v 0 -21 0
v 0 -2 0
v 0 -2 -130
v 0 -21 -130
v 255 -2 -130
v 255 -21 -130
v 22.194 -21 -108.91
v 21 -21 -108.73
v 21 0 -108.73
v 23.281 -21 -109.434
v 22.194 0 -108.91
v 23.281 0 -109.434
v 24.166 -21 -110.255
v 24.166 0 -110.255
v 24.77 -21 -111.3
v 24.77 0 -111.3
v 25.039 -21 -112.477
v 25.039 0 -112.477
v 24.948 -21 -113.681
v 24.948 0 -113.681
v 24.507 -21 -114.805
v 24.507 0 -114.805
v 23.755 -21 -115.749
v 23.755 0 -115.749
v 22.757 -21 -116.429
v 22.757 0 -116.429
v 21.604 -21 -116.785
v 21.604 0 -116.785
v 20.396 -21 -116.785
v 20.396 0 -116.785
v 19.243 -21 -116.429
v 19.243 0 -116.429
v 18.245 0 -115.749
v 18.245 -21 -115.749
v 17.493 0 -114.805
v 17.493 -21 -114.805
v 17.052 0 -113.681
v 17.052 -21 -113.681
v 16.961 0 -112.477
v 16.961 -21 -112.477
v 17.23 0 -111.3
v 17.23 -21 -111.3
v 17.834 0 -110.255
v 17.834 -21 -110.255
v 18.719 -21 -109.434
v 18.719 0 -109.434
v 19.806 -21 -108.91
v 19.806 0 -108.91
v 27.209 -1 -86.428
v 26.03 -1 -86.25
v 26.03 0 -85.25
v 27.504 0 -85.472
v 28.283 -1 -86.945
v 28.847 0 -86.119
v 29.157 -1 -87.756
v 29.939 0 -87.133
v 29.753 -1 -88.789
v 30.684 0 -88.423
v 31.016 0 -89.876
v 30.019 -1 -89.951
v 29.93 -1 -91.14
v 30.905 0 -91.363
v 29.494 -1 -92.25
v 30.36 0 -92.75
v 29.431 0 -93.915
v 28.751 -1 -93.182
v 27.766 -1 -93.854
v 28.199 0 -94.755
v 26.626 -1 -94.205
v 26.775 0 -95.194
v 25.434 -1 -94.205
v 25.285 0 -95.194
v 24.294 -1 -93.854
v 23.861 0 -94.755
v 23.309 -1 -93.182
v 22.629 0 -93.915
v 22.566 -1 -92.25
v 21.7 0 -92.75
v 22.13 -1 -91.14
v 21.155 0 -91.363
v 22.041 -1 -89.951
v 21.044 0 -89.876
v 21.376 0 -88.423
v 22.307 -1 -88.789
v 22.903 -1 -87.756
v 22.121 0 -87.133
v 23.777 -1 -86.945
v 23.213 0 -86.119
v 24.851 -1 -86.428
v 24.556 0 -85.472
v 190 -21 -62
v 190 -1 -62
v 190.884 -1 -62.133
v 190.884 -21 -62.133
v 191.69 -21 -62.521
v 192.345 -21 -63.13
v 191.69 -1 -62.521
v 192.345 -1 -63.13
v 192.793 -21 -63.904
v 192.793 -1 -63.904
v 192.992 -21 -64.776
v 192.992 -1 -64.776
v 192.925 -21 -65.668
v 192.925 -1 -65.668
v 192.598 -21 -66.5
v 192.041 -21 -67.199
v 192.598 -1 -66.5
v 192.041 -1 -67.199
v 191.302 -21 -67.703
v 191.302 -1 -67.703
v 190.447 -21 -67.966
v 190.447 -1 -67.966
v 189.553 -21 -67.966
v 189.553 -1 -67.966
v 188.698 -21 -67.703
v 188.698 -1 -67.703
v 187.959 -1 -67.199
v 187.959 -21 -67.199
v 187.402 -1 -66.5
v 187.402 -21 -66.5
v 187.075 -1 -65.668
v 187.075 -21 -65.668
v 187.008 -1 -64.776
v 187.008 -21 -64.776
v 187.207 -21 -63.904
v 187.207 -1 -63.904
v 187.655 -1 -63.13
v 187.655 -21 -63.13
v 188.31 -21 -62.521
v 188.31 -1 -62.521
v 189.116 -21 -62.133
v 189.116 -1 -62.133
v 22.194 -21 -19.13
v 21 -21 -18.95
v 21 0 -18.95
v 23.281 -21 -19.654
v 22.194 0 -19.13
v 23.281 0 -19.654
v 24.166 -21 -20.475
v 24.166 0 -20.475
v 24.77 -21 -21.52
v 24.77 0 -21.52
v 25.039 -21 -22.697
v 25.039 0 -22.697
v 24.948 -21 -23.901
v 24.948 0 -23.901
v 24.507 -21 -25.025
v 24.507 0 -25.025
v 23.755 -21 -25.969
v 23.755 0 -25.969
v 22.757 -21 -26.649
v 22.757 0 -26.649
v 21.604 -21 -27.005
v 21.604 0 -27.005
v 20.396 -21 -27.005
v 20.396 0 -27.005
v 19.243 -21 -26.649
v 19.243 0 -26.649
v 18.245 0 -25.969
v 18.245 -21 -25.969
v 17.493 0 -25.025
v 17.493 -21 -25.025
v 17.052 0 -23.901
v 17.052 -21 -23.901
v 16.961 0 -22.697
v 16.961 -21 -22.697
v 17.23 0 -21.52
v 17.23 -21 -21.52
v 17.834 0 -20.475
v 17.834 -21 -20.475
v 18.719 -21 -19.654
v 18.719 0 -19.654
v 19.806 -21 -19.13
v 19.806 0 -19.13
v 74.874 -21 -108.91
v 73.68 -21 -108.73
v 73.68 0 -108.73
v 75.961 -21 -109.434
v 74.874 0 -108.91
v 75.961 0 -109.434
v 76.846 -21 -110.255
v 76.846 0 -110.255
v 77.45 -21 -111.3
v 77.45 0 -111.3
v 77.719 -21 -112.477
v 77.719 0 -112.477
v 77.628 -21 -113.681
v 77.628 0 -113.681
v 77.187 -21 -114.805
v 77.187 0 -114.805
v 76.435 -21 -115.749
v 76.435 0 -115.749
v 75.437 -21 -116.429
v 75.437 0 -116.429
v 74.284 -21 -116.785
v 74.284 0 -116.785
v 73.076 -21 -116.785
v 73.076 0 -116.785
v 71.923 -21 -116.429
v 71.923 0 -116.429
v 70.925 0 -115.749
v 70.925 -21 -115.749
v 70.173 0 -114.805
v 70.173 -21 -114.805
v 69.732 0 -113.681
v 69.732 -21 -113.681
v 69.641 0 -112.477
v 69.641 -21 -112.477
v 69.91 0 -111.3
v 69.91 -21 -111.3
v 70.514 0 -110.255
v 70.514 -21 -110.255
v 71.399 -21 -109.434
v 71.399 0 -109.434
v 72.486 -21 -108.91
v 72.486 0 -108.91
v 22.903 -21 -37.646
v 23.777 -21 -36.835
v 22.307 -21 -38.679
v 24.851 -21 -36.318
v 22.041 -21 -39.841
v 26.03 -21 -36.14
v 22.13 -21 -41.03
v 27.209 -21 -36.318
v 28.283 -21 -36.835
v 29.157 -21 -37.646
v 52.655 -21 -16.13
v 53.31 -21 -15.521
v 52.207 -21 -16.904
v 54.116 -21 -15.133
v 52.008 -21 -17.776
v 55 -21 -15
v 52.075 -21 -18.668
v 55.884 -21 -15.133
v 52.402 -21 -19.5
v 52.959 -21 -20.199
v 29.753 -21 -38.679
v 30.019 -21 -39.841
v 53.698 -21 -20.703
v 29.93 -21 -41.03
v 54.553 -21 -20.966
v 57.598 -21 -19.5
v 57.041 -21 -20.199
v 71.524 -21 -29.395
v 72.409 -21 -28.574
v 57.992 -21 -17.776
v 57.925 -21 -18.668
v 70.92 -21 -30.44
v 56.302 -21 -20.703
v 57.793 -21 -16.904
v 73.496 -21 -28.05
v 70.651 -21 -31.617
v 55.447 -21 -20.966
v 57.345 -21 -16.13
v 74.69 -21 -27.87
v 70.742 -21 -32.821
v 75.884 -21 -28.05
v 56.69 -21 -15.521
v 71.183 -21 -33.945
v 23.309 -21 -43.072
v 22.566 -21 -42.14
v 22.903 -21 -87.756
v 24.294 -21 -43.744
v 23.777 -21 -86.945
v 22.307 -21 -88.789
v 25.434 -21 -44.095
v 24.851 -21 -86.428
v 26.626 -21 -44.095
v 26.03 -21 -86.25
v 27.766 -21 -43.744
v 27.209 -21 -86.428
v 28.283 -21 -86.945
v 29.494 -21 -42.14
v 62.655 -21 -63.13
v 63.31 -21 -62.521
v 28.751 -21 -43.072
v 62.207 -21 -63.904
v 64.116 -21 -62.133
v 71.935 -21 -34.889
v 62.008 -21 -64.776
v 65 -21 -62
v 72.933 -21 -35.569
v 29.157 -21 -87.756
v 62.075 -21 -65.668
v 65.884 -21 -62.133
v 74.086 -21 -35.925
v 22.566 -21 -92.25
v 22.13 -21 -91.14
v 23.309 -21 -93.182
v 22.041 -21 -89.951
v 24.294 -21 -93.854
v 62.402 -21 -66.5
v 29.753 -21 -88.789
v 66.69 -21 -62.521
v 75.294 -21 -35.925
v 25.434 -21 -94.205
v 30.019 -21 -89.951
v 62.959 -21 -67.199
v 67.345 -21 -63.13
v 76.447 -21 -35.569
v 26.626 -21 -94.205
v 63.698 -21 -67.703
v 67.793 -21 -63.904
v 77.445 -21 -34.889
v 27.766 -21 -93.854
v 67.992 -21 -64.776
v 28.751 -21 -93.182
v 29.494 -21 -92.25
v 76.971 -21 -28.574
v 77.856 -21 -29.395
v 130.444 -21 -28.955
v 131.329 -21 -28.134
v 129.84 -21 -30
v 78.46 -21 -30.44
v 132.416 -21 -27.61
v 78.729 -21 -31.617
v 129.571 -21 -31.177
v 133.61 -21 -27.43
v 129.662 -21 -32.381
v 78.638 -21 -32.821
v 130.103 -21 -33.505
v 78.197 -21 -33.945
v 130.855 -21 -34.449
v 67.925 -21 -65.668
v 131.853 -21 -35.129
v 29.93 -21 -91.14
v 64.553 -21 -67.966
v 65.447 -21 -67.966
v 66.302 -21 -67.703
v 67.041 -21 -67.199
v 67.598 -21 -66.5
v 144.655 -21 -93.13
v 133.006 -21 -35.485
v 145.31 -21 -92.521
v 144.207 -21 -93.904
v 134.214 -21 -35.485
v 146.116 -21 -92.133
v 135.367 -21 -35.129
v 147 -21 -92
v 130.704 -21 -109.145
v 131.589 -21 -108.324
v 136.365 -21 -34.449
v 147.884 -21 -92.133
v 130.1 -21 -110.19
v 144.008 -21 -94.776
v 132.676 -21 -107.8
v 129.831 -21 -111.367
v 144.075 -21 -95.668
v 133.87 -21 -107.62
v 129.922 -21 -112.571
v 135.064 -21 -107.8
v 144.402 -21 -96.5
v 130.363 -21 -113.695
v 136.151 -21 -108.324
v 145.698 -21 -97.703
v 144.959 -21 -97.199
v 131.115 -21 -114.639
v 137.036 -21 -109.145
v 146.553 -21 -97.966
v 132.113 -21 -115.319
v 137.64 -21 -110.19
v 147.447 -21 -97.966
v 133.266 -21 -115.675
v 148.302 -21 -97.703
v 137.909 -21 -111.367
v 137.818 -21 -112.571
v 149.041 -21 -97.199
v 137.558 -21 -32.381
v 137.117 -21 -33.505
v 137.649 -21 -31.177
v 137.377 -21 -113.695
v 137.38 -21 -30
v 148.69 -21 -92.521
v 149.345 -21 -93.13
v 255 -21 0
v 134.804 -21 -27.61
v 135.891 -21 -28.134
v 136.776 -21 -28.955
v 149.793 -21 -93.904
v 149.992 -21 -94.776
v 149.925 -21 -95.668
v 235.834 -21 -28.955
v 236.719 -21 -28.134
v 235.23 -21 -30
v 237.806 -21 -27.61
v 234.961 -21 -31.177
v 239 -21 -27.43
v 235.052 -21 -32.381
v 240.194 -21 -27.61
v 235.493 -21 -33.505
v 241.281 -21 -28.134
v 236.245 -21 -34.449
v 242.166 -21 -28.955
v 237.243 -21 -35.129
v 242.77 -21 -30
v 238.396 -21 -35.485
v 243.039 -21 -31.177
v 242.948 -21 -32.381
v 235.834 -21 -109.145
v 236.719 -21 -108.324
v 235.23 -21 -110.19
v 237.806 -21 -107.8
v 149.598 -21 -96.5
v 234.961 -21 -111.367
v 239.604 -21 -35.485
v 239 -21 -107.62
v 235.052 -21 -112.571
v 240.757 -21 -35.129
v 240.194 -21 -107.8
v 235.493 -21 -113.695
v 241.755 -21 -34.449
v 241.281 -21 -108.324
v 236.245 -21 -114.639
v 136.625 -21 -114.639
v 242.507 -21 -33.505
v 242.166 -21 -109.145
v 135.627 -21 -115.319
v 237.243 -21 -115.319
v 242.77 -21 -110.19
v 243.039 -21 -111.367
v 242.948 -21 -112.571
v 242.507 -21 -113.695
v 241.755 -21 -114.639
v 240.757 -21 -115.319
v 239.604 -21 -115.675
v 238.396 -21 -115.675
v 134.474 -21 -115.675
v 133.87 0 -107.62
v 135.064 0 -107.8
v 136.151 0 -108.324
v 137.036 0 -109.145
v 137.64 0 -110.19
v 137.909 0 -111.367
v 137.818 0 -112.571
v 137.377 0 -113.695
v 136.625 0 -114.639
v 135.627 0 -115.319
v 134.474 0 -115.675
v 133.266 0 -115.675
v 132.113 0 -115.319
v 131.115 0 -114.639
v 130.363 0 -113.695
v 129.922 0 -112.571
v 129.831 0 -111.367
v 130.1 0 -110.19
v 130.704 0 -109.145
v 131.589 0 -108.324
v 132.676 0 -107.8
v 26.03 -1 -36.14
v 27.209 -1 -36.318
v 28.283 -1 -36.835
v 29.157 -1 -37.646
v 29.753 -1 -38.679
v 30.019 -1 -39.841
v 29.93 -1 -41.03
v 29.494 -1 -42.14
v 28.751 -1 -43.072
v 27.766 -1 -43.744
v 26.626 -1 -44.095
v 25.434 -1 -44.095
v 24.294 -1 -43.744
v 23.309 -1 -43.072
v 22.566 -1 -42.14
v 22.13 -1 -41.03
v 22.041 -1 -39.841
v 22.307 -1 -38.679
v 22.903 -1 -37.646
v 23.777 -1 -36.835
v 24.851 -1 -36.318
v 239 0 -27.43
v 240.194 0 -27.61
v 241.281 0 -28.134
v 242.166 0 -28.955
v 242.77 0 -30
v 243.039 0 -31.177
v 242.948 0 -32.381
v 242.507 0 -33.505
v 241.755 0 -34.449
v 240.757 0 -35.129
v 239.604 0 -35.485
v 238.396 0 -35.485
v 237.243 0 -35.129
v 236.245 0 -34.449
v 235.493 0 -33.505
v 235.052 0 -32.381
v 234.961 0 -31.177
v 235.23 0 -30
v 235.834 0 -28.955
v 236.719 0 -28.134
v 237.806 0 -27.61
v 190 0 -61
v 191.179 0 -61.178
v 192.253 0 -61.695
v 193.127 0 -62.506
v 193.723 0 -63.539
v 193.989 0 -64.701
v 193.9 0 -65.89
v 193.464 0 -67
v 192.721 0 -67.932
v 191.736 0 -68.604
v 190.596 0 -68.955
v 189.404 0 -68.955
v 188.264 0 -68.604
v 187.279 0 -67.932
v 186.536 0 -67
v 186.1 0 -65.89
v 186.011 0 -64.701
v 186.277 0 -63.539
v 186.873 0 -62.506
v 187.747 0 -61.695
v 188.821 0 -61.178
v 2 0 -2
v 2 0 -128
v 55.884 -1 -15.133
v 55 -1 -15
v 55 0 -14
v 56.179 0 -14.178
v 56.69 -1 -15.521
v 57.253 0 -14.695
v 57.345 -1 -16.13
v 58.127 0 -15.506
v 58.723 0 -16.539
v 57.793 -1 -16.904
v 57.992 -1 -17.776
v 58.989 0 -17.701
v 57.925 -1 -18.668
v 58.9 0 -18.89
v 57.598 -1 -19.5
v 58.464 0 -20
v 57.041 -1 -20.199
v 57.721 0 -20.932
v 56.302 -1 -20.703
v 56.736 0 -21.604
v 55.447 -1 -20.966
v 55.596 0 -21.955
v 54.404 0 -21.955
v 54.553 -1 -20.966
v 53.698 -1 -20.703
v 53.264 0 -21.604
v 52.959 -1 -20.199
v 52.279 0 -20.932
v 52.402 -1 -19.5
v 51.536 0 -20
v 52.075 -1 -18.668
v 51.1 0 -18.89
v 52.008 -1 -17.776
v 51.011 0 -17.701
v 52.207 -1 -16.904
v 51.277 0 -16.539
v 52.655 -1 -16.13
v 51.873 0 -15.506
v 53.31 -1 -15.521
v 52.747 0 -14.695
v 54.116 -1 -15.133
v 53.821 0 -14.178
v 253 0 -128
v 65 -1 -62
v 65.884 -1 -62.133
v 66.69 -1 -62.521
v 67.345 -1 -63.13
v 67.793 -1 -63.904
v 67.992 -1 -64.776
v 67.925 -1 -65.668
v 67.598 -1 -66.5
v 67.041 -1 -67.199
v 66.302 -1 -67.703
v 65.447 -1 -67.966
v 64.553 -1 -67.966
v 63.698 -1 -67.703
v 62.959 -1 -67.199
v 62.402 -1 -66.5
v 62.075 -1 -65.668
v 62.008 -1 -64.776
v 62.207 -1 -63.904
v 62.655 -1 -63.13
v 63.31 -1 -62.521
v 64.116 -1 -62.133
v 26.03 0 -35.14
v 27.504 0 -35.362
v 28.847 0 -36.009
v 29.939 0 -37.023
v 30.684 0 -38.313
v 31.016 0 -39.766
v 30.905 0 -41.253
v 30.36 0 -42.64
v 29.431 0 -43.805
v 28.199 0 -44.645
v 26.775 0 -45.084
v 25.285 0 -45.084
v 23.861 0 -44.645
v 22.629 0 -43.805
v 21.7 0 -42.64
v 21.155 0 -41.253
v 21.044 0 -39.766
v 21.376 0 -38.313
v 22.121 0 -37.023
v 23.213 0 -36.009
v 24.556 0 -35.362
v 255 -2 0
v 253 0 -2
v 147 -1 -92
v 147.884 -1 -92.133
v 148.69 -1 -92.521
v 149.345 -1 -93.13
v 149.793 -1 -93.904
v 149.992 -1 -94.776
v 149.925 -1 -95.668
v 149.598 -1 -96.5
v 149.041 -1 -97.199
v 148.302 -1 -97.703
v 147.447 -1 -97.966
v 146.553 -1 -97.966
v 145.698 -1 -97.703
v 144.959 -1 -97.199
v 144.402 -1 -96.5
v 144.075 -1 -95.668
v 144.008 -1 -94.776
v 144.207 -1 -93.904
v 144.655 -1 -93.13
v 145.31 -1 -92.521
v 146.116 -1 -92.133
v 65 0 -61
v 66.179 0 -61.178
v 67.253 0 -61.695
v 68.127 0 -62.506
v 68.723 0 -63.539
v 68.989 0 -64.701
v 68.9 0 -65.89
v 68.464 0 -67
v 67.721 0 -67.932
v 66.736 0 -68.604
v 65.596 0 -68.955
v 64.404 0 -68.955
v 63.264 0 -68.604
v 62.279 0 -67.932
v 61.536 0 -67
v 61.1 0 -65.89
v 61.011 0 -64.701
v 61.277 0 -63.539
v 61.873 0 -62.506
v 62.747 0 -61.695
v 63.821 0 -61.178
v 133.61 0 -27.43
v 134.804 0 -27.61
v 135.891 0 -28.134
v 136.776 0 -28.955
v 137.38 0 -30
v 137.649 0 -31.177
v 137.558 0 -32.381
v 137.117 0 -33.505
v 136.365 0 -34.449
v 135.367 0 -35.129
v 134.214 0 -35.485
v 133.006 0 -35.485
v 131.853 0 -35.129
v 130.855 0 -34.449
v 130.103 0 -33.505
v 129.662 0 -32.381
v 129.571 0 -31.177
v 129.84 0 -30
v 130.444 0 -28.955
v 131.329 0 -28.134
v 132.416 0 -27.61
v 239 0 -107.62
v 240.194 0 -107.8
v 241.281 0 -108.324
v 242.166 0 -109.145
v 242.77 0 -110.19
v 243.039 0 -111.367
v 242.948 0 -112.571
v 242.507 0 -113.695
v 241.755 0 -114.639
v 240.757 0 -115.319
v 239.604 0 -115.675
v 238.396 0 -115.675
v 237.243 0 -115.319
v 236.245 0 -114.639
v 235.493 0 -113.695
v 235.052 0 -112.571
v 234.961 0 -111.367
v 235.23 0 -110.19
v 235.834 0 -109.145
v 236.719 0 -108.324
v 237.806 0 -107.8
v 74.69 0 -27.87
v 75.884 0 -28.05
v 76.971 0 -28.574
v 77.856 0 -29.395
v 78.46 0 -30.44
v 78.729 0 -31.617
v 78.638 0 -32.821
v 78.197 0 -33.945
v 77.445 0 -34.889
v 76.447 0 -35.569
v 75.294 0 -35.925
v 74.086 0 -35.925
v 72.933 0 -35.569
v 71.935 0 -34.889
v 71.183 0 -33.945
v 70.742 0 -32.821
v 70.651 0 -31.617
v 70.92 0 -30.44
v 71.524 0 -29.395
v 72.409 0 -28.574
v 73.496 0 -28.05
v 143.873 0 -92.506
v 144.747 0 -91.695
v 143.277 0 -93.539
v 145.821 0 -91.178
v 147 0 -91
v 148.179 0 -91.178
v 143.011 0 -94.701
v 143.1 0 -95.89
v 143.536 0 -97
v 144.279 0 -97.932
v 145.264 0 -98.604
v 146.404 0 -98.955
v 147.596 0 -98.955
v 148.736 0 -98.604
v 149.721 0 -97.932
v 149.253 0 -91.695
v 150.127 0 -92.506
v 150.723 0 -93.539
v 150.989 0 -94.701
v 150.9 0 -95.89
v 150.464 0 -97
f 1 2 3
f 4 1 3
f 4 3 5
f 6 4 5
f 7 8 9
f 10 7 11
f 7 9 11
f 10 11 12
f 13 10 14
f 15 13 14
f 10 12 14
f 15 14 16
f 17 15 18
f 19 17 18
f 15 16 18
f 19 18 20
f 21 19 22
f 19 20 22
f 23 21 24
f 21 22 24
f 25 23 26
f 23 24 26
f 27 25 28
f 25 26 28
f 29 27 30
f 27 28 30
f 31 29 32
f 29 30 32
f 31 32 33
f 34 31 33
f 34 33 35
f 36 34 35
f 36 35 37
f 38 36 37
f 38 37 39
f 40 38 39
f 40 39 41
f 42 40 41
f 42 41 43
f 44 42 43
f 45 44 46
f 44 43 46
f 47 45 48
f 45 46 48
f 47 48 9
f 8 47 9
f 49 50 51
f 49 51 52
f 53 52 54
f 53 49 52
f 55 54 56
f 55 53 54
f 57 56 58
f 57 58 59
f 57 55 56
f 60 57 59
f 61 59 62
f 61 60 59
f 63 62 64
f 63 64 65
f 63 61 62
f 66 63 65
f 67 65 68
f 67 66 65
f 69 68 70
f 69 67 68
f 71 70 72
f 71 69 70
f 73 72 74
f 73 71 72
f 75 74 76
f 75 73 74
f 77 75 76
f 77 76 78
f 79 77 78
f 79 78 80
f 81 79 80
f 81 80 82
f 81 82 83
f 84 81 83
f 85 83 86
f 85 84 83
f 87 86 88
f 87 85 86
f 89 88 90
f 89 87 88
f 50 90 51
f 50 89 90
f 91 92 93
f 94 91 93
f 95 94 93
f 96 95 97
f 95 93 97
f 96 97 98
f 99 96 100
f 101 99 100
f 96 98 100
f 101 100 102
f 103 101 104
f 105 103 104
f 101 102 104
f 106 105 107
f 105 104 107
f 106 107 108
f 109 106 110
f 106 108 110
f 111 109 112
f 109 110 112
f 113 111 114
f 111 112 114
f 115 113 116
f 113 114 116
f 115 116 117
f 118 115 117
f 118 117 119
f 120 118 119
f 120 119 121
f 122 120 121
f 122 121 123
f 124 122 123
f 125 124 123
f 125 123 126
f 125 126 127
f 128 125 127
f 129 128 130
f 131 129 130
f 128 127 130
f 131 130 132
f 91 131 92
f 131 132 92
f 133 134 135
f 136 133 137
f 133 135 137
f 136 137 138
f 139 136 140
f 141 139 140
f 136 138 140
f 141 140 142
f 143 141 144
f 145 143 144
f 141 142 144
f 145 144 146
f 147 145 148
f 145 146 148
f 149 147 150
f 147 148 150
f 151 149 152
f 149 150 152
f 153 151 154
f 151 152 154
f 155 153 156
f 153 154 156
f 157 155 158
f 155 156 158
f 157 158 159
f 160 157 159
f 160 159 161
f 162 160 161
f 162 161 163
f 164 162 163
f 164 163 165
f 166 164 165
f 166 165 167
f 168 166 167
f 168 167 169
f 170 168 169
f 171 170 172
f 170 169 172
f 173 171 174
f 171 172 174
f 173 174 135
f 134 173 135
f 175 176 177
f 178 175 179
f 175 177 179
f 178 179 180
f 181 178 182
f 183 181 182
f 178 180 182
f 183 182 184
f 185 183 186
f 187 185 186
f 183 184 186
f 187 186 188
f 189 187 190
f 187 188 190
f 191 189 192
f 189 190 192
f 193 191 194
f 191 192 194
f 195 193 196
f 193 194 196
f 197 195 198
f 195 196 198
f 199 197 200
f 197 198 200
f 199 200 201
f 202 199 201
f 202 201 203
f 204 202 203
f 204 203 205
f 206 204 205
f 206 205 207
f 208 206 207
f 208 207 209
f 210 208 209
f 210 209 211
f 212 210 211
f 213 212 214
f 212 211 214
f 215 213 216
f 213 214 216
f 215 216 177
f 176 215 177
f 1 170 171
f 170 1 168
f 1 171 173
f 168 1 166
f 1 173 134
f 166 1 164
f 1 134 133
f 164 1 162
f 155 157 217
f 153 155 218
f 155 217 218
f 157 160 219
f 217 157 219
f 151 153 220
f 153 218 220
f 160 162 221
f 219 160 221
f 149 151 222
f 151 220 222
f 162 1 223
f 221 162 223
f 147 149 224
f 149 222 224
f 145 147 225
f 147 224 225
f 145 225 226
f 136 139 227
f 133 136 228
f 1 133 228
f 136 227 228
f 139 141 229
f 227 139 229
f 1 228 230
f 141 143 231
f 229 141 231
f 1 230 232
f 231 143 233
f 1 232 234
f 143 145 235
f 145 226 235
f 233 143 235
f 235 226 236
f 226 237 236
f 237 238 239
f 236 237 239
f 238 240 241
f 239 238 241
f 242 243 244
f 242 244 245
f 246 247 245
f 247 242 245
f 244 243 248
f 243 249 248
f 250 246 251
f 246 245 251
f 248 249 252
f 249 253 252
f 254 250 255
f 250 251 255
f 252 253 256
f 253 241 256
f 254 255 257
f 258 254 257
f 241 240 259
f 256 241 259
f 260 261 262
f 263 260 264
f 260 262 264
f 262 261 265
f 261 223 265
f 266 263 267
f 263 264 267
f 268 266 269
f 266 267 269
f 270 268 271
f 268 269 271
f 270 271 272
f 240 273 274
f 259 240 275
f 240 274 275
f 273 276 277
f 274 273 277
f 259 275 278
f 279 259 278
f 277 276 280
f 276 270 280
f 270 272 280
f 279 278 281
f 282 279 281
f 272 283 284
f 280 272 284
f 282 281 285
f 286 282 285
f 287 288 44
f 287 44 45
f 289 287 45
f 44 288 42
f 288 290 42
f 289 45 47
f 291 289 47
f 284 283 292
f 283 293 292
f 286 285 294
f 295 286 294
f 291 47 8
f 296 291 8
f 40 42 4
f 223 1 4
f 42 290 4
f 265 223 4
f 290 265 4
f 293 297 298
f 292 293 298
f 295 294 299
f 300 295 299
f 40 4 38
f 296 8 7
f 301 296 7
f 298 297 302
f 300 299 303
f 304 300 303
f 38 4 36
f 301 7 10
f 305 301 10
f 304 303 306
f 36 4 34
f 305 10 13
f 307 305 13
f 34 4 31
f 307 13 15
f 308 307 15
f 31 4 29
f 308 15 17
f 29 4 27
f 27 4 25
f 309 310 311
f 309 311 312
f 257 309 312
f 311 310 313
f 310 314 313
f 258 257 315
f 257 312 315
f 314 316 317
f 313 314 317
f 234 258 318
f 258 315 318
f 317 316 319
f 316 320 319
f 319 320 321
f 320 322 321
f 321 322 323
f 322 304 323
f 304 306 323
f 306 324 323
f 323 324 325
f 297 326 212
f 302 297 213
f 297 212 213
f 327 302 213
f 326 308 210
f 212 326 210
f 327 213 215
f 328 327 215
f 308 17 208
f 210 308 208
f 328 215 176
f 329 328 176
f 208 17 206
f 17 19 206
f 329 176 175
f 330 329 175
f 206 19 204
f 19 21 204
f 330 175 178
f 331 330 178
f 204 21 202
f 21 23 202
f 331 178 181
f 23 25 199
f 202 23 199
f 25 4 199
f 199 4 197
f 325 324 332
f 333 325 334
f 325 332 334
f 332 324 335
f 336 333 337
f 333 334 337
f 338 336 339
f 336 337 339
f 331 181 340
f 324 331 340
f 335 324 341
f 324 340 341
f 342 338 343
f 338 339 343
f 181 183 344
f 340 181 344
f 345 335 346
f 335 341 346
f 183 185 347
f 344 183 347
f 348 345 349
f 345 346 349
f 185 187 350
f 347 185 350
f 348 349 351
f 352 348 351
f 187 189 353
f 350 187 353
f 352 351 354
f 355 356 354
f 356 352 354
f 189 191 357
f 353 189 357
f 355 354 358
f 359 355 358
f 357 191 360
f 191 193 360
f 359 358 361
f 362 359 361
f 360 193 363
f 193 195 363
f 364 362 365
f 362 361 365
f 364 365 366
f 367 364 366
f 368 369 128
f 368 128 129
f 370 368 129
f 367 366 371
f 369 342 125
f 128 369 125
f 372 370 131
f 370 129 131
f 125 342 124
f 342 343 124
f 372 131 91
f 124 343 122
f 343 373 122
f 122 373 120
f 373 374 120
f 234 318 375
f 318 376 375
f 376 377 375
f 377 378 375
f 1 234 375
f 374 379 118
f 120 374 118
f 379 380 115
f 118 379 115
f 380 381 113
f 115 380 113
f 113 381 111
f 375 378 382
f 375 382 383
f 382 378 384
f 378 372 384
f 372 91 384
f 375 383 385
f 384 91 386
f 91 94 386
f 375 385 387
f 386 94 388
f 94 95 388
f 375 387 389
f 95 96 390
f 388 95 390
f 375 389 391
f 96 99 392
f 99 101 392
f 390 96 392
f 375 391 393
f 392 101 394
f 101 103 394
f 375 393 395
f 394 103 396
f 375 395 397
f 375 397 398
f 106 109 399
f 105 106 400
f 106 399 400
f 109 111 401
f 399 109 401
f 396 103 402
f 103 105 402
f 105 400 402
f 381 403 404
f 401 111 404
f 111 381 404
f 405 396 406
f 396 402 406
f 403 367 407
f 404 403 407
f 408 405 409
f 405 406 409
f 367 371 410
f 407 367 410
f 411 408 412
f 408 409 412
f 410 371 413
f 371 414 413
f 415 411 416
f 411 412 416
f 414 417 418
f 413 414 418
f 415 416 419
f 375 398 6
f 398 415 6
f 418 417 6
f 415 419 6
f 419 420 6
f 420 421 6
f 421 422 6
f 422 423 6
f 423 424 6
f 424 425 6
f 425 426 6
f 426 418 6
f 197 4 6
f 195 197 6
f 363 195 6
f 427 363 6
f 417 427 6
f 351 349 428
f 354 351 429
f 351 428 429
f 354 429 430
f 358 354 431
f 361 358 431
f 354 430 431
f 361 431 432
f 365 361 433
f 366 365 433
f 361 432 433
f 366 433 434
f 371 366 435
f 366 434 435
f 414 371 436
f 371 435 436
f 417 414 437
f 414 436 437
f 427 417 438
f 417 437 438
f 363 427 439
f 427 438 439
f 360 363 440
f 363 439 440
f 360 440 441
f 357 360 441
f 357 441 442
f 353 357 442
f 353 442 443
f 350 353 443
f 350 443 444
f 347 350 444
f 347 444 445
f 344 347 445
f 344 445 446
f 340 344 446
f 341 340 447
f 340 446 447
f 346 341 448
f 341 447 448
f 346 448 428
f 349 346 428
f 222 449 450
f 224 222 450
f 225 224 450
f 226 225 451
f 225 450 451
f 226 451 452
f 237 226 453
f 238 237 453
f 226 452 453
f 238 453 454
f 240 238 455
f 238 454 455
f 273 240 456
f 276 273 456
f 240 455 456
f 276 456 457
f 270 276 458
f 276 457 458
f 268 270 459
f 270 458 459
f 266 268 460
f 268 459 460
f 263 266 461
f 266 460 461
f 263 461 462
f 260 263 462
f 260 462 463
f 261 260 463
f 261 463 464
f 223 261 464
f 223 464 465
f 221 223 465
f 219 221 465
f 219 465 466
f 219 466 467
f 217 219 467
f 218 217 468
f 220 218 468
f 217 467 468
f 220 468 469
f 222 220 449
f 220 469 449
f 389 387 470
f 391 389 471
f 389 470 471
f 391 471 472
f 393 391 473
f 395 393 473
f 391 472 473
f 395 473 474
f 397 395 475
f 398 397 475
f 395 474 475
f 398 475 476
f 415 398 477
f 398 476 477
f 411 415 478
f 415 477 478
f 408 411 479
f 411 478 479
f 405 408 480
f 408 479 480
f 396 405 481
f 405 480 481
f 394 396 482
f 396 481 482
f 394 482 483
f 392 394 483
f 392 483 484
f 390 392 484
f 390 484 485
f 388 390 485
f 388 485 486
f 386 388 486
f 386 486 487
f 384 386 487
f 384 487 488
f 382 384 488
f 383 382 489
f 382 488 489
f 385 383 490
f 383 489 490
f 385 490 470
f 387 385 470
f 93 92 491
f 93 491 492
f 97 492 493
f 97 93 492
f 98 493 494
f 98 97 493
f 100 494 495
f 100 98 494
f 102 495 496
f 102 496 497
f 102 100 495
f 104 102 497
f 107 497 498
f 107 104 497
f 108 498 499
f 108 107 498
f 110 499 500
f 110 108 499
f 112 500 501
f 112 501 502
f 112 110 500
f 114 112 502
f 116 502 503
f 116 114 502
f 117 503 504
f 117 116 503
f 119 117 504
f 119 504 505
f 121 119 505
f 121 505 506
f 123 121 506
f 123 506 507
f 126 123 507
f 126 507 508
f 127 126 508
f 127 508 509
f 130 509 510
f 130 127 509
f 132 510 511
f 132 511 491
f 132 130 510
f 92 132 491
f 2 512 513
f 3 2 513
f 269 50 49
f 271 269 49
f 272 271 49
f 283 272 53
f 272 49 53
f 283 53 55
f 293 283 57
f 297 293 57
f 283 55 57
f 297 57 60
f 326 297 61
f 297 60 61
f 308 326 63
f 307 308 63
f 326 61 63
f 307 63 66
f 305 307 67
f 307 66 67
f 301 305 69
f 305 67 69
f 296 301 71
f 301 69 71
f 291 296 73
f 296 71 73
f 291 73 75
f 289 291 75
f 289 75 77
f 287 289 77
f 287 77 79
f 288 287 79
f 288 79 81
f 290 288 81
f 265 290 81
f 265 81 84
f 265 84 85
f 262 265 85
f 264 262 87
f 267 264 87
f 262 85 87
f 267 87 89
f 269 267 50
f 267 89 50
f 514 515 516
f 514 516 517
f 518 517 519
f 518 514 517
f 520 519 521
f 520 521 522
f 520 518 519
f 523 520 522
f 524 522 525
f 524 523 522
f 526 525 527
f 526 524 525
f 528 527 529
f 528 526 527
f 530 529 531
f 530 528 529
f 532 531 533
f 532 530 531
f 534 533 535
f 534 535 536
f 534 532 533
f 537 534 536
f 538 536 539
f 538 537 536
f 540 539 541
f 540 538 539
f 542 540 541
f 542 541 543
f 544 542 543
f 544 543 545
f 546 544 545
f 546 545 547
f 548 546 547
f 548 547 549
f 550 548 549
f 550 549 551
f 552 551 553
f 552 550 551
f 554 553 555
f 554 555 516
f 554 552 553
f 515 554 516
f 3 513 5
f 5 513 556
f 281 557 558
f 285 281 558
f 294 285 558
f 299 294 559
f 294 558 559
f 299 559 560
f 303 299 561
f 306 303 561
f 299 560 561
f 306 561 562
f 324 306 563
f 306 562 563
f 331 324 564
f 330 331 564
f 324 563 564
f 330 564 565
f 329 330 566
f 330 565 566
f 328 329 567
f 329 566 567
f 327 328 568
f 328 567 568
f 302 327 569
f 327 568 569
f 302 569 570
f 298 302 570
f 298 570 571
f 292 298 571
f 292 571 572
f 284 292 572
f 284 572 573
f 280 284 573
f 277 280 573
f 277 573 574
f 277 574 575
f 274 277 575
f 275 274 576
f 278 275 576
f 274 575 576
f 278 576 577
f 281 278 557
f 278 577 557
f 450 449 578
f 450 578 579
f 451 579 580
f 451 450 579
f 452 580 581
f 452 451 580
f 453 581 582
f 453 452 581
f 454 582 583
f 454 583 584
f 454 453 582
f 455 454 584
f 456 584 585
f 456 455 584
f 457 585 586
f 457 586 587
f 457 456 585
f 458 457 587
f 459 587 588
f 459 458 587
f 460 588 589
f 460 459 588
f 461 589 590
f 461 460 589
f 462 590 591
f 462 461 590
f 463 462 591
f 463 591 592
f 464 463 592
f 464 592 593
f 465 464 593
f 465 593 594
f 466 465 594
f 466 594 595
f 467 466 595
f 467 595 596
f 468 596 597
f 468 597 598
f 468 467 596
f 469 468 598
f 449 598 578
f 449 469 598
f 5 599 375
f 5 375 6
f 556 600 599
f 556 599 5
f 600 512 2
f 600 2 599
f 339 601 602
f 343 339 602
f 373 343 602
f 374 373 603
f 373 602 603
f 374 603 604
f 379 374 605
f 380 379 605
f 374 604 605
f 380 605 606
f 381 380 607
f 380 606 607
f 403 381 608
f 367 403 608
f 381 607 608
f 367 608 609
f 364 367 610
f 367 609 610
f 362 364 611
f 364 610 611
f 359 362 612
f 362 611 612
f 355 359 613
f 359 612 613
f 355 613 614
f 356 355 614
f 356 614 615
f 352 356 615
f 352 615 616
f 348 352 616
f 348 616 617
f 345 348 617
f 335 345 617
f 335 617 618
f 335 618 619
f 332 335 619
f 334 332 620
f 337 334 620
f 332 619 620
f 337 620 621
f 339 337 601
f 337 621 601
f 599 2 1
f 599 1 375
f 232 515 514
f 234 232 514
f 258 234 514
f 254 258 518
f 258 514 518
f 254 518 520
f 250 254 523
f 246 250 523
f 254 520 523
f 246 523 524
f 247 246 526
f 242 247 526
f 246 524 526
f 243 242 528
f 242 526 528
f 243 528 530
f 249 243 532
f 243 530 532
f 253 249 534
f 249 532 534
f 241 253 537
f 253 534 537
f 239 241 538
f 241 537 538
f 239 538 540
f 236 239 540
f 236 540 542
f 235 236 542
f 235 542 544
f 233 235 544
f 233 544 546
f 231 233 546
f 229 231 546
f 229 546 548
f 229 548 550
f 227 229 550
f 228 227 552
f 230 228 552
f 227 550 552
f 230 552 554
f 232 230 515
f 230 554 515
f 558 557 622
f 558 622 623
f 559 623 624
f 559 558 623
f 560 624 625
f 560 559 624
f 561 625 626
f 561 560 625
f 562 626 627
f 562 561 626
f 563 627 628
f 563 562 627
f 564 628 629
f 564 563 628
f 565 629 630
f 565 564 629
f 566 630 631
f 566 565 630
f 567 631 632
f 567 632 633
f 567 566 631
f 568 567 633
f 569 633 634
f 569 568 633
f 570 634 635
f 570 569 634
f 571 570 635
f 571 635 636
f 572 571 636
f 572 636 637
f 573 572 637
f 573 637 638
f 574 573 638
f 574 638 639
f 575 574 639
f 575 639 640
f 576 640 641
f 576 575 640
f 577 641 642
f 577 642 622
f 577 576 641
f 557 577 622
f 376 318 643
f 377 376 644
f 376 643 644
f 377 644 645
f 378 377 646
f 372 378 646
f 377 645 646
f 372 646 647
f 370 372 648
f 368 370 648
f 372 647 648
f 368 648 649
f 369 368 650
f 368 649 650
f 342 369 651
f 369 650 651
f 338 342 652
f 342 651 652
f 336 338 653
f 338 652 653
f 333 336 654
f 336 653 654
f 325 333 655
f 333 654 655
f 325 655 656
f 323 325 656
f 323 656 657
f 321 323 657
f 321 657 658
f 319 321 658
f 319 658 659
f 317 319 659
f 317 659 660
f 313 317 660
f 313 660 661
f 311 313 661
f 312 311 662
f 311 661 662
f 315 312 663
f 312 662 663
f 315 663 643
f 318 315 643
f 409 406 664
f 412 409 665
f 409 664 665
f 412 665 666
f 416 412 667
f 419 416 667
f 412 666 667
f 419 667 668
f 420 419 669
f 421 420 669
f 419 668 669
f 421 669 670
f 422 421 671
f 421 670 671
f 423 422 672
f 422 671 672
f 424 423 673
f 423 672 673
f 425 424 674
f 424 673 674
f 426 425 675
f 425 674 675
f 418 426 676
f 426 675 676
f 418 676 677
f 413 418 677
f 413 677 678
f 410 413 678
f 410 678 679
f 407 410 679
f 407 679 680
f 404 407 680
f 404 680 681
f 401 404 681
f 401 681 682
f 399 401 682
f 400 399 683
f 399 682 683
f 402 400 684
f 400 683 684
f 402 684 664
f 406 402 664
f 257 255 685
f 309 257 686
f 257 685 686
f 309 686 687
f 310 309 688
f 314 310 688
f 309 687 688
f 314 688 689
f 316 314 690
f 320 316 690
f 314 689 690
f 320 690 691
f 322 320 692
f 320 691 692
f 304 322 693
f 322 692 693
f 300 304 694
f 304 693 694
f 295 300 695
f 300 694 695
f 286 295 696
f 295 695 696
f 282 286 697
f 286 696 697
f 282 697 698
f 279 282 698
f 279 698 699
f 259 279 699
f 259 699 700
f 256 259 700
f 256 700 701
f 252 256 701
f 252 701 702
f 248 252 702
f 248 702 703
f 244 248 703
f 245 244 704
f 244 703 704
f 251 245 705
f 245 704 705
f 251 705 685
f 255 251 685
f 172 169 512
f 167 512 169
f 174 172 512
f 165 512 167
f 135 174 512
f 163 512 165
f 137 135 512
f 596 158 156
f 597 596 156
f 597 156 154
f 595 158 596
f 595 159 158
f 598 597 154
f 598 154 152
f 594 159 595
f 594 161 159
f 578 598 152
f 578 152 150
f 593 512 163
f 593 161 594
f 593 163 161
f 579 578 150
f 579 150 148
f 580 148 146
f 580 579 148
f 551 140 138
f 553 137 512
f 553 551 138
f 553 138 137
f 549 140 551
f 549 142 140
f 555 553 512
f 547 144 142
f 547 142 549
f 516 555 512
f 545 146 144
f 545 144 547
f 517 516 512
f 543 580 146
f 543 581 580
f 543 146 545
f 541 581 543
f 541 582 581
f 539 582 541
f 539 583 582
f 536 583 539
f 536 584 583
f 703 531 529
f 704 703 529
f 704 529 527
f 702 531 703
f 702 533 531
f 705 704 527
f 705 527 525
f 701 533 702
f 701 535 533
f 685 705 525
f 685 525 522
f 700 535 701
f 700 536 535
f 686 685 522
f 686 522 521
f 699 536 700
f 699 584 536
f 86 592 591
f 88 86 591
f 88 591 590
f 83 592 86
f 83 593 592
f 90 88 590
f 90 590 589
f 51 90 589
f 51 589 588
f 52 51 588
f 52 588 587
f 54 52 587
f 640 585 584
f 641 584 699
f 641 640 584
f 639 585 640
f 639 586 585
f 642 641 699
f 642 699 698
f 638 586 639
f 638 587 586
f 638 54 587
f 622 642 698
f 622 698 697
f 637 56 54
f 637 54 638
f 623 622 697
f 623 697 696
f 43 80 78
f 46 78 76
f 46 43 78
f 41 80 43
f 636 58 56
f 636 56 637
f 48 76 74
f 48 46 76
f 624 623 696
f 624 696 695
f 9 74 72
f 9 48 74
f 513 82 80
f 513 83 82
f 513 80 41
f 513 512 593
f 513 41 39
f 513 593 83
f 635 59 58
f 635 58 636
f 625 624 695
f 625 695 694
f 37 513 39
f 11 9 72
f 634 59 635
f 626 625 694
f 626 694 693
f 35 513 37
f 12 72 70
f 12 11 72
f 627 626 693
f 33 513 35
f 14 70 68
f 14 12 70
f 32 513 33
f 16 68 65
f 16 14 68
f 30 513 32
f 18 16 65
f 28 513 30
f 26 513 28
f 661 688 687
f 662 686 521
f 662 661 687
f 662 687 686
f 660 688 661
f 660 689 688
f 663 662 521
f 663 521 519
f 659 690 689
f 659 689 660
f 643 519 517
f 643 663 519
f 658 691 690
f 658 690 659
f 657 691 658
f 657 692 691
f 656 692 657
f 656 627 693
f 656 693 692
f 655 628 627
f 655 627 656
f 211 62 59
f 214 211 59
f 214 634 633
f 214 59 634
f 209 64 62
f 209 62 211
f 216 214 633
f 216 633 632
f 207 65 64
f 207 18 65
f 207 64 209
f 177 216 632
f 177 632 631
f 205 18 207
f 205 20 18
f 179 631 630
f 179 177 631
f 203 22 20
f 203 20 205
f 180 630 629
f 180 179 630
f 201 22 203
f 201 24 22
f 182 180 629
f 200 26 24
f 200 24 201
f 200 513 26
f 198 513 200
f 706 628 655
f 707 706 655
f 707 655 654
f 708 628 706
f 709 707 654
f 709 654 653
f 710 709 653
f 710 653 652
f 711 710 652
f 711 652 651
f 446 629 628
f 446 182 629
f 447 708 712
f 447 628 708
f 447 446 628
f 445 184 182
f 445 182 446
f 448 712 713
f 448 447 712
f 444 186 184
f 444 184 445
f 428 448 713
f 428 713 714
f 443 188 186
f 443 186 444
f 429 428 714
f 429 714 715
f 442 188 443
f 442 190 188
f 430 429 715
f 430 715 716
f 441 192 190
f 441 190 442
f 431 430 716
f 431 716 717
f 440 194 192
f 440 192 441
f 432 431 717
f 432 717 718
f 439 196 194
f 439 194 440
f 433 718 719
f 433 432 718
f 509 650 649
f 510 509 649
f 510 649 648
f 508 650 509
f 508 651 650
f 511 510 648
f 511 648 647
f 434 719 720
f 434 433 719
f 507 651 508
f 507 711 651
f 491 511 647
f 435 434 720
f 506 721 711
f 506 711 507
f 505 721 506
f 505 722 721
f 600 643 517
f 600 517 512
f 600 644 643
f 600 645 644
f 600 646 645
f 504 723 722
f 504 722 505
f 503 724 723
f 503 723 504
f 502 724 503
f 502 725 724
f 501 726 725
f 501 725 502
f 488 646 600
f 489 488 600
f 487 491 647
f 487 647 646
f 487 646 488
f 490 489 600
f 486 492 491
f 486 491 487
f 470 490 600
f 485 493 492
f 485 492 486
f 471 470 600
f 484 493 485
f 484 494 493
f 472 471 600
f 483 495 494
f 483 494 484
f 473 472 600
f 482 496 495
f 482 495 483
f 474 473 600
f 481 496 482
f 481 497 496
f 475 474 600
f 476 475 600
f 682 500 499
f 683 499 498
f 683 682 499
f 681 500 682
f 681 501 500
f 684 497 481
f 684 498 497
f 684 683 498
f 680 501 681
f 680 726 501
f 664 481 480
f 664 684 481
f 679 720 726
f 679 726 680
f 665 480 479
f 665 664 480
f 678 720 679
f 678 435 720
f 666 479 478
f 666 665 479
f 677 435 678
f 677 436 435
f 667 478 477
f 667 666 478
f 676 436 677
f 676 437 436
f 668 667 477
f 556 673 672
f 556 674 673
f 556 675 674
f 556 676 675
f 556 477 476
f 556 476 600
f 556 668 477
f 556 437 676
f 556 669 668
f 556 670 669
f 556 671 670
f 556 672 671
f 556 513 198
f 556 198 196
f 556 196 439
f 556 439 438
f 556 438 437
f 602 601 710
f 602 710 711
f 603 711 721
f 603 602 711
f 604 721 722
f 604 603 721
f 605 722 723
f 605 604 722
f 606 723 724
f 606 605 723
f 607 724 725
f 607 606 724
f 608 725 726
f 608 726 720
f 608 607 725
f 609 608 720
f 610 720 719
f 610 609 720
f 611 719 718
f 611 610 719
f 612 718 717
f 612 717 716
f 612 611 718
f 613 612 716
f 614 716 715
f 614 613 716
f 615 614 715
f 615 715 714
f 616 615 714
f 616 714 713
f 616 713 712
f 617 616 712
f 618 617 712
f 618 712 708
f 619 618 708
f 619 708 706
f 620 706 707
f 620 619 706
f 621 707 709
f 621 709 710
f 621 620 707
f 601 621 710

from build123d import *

# Parameters (mm, degrees)
SKETCH1_W           = 255
SKETCH1_H           = 130
SKETCH1_R           = 4.05
SKETCH1_R_2         = 4
SKETCH1_R_3         = 3
BOSS_EXTRUDE1_DEPTH = 21
CHAMFER1_SIZE       = 2
CHAMFER5_SIZE       = 1
CHAMFER6_SIZE       = 1


with BuildPart() as part:
    # Sketch1 → Boss-Extrude1 (new body)
    with BuildSketch(Plane(origin=(0, 0, 0), x_dir=(1, 0, 0), z_dir=(0, 1, 0))):
        with Locations((127.5, 65)):
            Rectangle(SKETCH1_W, SKETCH1_H)
        with Locations(Location((73.68, 112.78, 0), (0, 0, 270))):
            Circle(SKETCH1_R, mode=Mode.SUBTRACT)
        with Locations(Location((133.87, 111.67, 0), (0, 0, 270))):
            Circle(SKETCH1_R, mode=Mode.SUBTRACT)
        with Locations(Location((133.61, 31.48, 0), (0, 0, 270))):
            Circle(SKETCH1_R, mode=Mode.SUBTRACT)
        with Locations(Location((74.69, 31.92, 0), (0, 0, 270))):
            Circle(SKETCH1_R, mode=Mode.SUBTRACT)
        with Locations(Location((26.03, 90.25, 0), (0, 0, 270))):
            Circle(SKETCH1_R_2, mode=Mode.SUBTRACT)
        with Locations(Location((26.03, 40.14, 0), (0, 0, 270))):
            Circle(SKETCH1_R_2, mode=Mode.SUBTRACT)
        with Locations(Location((21, 112.78, 0), (0, 0, 270))):
            Circle(SKETCH1_R, mode=Mode.SUBTRACT)
        with Locations(Location((239, 111.67, 0), (0, 0, 270))):
            Circle(SKETCH1_R, mode=Mode.SUBTRACT)
        with Locations(Location((239, 31.48, 0), (0, 0, 270))):
            Circle(SKETCH1_R, mode=Mode.SUBTRACT)
        with Locations(Location((21, 23, 0), (0, 0, 270))):
            Circle(SKETCH1_R, mode=Mode.SUBTRACT)
        with Locations(Location((65, 65, 0), (0, 0, 270))):
            Circle(SKETCH1_R_3, mode=Mode.SUBTRACT)
        with Locations(Location((190, 65, 0), (0, 0, 270))):
            Circle(SKETCH1_R_3, mode=Mode.SUBTRACT)
        with Locations(Location((147, 95, 0), (0, 0, 270))):
            Circle(SKETCH1_R_3, mode=Mode.SUBTRACT)
        with Locations(Location((55, 18, 0), (0, 0, 270))):
            Circle(SKETCH1_R_3, mode=Mode.SUBTRACT)
    extrude(amount=-BOSS_EXTRUDE1_DEPTH)

    # Chamfer1
    chamfer1_edges = [part.edges().sort_by_distance(p)[0] for p in [
        (127.5, 0, -130),
        (255, 0, -65),
        (127.5, 0, 0),
        (0, 0, -65),
    ]]
    chamfer(chamfer1_edges, length=CHAMFER1_SIZE)

    # Chamfer5
    chamfer5_edges = [part.edges().sort_by_distance(p)[0] for p in [
        (65, 0, -68),
        (190, 0, -68),
        (147, 0, -98),
        (55, 0, -21),
    ]]
    chamfer(chamfer5_edges, length=CHAMFER5_SIZE)

    # Chamfer6
    chamfer6_edges = [part.edges().sort_by_distance(p)[0] for p in [
        (26.03, 0, -94.25),
        (26.03, 0, -44.14),
    ]]
    chamfer(chamfer6_edges, length=CHAMFER6_SIZE)


solid = part.part
